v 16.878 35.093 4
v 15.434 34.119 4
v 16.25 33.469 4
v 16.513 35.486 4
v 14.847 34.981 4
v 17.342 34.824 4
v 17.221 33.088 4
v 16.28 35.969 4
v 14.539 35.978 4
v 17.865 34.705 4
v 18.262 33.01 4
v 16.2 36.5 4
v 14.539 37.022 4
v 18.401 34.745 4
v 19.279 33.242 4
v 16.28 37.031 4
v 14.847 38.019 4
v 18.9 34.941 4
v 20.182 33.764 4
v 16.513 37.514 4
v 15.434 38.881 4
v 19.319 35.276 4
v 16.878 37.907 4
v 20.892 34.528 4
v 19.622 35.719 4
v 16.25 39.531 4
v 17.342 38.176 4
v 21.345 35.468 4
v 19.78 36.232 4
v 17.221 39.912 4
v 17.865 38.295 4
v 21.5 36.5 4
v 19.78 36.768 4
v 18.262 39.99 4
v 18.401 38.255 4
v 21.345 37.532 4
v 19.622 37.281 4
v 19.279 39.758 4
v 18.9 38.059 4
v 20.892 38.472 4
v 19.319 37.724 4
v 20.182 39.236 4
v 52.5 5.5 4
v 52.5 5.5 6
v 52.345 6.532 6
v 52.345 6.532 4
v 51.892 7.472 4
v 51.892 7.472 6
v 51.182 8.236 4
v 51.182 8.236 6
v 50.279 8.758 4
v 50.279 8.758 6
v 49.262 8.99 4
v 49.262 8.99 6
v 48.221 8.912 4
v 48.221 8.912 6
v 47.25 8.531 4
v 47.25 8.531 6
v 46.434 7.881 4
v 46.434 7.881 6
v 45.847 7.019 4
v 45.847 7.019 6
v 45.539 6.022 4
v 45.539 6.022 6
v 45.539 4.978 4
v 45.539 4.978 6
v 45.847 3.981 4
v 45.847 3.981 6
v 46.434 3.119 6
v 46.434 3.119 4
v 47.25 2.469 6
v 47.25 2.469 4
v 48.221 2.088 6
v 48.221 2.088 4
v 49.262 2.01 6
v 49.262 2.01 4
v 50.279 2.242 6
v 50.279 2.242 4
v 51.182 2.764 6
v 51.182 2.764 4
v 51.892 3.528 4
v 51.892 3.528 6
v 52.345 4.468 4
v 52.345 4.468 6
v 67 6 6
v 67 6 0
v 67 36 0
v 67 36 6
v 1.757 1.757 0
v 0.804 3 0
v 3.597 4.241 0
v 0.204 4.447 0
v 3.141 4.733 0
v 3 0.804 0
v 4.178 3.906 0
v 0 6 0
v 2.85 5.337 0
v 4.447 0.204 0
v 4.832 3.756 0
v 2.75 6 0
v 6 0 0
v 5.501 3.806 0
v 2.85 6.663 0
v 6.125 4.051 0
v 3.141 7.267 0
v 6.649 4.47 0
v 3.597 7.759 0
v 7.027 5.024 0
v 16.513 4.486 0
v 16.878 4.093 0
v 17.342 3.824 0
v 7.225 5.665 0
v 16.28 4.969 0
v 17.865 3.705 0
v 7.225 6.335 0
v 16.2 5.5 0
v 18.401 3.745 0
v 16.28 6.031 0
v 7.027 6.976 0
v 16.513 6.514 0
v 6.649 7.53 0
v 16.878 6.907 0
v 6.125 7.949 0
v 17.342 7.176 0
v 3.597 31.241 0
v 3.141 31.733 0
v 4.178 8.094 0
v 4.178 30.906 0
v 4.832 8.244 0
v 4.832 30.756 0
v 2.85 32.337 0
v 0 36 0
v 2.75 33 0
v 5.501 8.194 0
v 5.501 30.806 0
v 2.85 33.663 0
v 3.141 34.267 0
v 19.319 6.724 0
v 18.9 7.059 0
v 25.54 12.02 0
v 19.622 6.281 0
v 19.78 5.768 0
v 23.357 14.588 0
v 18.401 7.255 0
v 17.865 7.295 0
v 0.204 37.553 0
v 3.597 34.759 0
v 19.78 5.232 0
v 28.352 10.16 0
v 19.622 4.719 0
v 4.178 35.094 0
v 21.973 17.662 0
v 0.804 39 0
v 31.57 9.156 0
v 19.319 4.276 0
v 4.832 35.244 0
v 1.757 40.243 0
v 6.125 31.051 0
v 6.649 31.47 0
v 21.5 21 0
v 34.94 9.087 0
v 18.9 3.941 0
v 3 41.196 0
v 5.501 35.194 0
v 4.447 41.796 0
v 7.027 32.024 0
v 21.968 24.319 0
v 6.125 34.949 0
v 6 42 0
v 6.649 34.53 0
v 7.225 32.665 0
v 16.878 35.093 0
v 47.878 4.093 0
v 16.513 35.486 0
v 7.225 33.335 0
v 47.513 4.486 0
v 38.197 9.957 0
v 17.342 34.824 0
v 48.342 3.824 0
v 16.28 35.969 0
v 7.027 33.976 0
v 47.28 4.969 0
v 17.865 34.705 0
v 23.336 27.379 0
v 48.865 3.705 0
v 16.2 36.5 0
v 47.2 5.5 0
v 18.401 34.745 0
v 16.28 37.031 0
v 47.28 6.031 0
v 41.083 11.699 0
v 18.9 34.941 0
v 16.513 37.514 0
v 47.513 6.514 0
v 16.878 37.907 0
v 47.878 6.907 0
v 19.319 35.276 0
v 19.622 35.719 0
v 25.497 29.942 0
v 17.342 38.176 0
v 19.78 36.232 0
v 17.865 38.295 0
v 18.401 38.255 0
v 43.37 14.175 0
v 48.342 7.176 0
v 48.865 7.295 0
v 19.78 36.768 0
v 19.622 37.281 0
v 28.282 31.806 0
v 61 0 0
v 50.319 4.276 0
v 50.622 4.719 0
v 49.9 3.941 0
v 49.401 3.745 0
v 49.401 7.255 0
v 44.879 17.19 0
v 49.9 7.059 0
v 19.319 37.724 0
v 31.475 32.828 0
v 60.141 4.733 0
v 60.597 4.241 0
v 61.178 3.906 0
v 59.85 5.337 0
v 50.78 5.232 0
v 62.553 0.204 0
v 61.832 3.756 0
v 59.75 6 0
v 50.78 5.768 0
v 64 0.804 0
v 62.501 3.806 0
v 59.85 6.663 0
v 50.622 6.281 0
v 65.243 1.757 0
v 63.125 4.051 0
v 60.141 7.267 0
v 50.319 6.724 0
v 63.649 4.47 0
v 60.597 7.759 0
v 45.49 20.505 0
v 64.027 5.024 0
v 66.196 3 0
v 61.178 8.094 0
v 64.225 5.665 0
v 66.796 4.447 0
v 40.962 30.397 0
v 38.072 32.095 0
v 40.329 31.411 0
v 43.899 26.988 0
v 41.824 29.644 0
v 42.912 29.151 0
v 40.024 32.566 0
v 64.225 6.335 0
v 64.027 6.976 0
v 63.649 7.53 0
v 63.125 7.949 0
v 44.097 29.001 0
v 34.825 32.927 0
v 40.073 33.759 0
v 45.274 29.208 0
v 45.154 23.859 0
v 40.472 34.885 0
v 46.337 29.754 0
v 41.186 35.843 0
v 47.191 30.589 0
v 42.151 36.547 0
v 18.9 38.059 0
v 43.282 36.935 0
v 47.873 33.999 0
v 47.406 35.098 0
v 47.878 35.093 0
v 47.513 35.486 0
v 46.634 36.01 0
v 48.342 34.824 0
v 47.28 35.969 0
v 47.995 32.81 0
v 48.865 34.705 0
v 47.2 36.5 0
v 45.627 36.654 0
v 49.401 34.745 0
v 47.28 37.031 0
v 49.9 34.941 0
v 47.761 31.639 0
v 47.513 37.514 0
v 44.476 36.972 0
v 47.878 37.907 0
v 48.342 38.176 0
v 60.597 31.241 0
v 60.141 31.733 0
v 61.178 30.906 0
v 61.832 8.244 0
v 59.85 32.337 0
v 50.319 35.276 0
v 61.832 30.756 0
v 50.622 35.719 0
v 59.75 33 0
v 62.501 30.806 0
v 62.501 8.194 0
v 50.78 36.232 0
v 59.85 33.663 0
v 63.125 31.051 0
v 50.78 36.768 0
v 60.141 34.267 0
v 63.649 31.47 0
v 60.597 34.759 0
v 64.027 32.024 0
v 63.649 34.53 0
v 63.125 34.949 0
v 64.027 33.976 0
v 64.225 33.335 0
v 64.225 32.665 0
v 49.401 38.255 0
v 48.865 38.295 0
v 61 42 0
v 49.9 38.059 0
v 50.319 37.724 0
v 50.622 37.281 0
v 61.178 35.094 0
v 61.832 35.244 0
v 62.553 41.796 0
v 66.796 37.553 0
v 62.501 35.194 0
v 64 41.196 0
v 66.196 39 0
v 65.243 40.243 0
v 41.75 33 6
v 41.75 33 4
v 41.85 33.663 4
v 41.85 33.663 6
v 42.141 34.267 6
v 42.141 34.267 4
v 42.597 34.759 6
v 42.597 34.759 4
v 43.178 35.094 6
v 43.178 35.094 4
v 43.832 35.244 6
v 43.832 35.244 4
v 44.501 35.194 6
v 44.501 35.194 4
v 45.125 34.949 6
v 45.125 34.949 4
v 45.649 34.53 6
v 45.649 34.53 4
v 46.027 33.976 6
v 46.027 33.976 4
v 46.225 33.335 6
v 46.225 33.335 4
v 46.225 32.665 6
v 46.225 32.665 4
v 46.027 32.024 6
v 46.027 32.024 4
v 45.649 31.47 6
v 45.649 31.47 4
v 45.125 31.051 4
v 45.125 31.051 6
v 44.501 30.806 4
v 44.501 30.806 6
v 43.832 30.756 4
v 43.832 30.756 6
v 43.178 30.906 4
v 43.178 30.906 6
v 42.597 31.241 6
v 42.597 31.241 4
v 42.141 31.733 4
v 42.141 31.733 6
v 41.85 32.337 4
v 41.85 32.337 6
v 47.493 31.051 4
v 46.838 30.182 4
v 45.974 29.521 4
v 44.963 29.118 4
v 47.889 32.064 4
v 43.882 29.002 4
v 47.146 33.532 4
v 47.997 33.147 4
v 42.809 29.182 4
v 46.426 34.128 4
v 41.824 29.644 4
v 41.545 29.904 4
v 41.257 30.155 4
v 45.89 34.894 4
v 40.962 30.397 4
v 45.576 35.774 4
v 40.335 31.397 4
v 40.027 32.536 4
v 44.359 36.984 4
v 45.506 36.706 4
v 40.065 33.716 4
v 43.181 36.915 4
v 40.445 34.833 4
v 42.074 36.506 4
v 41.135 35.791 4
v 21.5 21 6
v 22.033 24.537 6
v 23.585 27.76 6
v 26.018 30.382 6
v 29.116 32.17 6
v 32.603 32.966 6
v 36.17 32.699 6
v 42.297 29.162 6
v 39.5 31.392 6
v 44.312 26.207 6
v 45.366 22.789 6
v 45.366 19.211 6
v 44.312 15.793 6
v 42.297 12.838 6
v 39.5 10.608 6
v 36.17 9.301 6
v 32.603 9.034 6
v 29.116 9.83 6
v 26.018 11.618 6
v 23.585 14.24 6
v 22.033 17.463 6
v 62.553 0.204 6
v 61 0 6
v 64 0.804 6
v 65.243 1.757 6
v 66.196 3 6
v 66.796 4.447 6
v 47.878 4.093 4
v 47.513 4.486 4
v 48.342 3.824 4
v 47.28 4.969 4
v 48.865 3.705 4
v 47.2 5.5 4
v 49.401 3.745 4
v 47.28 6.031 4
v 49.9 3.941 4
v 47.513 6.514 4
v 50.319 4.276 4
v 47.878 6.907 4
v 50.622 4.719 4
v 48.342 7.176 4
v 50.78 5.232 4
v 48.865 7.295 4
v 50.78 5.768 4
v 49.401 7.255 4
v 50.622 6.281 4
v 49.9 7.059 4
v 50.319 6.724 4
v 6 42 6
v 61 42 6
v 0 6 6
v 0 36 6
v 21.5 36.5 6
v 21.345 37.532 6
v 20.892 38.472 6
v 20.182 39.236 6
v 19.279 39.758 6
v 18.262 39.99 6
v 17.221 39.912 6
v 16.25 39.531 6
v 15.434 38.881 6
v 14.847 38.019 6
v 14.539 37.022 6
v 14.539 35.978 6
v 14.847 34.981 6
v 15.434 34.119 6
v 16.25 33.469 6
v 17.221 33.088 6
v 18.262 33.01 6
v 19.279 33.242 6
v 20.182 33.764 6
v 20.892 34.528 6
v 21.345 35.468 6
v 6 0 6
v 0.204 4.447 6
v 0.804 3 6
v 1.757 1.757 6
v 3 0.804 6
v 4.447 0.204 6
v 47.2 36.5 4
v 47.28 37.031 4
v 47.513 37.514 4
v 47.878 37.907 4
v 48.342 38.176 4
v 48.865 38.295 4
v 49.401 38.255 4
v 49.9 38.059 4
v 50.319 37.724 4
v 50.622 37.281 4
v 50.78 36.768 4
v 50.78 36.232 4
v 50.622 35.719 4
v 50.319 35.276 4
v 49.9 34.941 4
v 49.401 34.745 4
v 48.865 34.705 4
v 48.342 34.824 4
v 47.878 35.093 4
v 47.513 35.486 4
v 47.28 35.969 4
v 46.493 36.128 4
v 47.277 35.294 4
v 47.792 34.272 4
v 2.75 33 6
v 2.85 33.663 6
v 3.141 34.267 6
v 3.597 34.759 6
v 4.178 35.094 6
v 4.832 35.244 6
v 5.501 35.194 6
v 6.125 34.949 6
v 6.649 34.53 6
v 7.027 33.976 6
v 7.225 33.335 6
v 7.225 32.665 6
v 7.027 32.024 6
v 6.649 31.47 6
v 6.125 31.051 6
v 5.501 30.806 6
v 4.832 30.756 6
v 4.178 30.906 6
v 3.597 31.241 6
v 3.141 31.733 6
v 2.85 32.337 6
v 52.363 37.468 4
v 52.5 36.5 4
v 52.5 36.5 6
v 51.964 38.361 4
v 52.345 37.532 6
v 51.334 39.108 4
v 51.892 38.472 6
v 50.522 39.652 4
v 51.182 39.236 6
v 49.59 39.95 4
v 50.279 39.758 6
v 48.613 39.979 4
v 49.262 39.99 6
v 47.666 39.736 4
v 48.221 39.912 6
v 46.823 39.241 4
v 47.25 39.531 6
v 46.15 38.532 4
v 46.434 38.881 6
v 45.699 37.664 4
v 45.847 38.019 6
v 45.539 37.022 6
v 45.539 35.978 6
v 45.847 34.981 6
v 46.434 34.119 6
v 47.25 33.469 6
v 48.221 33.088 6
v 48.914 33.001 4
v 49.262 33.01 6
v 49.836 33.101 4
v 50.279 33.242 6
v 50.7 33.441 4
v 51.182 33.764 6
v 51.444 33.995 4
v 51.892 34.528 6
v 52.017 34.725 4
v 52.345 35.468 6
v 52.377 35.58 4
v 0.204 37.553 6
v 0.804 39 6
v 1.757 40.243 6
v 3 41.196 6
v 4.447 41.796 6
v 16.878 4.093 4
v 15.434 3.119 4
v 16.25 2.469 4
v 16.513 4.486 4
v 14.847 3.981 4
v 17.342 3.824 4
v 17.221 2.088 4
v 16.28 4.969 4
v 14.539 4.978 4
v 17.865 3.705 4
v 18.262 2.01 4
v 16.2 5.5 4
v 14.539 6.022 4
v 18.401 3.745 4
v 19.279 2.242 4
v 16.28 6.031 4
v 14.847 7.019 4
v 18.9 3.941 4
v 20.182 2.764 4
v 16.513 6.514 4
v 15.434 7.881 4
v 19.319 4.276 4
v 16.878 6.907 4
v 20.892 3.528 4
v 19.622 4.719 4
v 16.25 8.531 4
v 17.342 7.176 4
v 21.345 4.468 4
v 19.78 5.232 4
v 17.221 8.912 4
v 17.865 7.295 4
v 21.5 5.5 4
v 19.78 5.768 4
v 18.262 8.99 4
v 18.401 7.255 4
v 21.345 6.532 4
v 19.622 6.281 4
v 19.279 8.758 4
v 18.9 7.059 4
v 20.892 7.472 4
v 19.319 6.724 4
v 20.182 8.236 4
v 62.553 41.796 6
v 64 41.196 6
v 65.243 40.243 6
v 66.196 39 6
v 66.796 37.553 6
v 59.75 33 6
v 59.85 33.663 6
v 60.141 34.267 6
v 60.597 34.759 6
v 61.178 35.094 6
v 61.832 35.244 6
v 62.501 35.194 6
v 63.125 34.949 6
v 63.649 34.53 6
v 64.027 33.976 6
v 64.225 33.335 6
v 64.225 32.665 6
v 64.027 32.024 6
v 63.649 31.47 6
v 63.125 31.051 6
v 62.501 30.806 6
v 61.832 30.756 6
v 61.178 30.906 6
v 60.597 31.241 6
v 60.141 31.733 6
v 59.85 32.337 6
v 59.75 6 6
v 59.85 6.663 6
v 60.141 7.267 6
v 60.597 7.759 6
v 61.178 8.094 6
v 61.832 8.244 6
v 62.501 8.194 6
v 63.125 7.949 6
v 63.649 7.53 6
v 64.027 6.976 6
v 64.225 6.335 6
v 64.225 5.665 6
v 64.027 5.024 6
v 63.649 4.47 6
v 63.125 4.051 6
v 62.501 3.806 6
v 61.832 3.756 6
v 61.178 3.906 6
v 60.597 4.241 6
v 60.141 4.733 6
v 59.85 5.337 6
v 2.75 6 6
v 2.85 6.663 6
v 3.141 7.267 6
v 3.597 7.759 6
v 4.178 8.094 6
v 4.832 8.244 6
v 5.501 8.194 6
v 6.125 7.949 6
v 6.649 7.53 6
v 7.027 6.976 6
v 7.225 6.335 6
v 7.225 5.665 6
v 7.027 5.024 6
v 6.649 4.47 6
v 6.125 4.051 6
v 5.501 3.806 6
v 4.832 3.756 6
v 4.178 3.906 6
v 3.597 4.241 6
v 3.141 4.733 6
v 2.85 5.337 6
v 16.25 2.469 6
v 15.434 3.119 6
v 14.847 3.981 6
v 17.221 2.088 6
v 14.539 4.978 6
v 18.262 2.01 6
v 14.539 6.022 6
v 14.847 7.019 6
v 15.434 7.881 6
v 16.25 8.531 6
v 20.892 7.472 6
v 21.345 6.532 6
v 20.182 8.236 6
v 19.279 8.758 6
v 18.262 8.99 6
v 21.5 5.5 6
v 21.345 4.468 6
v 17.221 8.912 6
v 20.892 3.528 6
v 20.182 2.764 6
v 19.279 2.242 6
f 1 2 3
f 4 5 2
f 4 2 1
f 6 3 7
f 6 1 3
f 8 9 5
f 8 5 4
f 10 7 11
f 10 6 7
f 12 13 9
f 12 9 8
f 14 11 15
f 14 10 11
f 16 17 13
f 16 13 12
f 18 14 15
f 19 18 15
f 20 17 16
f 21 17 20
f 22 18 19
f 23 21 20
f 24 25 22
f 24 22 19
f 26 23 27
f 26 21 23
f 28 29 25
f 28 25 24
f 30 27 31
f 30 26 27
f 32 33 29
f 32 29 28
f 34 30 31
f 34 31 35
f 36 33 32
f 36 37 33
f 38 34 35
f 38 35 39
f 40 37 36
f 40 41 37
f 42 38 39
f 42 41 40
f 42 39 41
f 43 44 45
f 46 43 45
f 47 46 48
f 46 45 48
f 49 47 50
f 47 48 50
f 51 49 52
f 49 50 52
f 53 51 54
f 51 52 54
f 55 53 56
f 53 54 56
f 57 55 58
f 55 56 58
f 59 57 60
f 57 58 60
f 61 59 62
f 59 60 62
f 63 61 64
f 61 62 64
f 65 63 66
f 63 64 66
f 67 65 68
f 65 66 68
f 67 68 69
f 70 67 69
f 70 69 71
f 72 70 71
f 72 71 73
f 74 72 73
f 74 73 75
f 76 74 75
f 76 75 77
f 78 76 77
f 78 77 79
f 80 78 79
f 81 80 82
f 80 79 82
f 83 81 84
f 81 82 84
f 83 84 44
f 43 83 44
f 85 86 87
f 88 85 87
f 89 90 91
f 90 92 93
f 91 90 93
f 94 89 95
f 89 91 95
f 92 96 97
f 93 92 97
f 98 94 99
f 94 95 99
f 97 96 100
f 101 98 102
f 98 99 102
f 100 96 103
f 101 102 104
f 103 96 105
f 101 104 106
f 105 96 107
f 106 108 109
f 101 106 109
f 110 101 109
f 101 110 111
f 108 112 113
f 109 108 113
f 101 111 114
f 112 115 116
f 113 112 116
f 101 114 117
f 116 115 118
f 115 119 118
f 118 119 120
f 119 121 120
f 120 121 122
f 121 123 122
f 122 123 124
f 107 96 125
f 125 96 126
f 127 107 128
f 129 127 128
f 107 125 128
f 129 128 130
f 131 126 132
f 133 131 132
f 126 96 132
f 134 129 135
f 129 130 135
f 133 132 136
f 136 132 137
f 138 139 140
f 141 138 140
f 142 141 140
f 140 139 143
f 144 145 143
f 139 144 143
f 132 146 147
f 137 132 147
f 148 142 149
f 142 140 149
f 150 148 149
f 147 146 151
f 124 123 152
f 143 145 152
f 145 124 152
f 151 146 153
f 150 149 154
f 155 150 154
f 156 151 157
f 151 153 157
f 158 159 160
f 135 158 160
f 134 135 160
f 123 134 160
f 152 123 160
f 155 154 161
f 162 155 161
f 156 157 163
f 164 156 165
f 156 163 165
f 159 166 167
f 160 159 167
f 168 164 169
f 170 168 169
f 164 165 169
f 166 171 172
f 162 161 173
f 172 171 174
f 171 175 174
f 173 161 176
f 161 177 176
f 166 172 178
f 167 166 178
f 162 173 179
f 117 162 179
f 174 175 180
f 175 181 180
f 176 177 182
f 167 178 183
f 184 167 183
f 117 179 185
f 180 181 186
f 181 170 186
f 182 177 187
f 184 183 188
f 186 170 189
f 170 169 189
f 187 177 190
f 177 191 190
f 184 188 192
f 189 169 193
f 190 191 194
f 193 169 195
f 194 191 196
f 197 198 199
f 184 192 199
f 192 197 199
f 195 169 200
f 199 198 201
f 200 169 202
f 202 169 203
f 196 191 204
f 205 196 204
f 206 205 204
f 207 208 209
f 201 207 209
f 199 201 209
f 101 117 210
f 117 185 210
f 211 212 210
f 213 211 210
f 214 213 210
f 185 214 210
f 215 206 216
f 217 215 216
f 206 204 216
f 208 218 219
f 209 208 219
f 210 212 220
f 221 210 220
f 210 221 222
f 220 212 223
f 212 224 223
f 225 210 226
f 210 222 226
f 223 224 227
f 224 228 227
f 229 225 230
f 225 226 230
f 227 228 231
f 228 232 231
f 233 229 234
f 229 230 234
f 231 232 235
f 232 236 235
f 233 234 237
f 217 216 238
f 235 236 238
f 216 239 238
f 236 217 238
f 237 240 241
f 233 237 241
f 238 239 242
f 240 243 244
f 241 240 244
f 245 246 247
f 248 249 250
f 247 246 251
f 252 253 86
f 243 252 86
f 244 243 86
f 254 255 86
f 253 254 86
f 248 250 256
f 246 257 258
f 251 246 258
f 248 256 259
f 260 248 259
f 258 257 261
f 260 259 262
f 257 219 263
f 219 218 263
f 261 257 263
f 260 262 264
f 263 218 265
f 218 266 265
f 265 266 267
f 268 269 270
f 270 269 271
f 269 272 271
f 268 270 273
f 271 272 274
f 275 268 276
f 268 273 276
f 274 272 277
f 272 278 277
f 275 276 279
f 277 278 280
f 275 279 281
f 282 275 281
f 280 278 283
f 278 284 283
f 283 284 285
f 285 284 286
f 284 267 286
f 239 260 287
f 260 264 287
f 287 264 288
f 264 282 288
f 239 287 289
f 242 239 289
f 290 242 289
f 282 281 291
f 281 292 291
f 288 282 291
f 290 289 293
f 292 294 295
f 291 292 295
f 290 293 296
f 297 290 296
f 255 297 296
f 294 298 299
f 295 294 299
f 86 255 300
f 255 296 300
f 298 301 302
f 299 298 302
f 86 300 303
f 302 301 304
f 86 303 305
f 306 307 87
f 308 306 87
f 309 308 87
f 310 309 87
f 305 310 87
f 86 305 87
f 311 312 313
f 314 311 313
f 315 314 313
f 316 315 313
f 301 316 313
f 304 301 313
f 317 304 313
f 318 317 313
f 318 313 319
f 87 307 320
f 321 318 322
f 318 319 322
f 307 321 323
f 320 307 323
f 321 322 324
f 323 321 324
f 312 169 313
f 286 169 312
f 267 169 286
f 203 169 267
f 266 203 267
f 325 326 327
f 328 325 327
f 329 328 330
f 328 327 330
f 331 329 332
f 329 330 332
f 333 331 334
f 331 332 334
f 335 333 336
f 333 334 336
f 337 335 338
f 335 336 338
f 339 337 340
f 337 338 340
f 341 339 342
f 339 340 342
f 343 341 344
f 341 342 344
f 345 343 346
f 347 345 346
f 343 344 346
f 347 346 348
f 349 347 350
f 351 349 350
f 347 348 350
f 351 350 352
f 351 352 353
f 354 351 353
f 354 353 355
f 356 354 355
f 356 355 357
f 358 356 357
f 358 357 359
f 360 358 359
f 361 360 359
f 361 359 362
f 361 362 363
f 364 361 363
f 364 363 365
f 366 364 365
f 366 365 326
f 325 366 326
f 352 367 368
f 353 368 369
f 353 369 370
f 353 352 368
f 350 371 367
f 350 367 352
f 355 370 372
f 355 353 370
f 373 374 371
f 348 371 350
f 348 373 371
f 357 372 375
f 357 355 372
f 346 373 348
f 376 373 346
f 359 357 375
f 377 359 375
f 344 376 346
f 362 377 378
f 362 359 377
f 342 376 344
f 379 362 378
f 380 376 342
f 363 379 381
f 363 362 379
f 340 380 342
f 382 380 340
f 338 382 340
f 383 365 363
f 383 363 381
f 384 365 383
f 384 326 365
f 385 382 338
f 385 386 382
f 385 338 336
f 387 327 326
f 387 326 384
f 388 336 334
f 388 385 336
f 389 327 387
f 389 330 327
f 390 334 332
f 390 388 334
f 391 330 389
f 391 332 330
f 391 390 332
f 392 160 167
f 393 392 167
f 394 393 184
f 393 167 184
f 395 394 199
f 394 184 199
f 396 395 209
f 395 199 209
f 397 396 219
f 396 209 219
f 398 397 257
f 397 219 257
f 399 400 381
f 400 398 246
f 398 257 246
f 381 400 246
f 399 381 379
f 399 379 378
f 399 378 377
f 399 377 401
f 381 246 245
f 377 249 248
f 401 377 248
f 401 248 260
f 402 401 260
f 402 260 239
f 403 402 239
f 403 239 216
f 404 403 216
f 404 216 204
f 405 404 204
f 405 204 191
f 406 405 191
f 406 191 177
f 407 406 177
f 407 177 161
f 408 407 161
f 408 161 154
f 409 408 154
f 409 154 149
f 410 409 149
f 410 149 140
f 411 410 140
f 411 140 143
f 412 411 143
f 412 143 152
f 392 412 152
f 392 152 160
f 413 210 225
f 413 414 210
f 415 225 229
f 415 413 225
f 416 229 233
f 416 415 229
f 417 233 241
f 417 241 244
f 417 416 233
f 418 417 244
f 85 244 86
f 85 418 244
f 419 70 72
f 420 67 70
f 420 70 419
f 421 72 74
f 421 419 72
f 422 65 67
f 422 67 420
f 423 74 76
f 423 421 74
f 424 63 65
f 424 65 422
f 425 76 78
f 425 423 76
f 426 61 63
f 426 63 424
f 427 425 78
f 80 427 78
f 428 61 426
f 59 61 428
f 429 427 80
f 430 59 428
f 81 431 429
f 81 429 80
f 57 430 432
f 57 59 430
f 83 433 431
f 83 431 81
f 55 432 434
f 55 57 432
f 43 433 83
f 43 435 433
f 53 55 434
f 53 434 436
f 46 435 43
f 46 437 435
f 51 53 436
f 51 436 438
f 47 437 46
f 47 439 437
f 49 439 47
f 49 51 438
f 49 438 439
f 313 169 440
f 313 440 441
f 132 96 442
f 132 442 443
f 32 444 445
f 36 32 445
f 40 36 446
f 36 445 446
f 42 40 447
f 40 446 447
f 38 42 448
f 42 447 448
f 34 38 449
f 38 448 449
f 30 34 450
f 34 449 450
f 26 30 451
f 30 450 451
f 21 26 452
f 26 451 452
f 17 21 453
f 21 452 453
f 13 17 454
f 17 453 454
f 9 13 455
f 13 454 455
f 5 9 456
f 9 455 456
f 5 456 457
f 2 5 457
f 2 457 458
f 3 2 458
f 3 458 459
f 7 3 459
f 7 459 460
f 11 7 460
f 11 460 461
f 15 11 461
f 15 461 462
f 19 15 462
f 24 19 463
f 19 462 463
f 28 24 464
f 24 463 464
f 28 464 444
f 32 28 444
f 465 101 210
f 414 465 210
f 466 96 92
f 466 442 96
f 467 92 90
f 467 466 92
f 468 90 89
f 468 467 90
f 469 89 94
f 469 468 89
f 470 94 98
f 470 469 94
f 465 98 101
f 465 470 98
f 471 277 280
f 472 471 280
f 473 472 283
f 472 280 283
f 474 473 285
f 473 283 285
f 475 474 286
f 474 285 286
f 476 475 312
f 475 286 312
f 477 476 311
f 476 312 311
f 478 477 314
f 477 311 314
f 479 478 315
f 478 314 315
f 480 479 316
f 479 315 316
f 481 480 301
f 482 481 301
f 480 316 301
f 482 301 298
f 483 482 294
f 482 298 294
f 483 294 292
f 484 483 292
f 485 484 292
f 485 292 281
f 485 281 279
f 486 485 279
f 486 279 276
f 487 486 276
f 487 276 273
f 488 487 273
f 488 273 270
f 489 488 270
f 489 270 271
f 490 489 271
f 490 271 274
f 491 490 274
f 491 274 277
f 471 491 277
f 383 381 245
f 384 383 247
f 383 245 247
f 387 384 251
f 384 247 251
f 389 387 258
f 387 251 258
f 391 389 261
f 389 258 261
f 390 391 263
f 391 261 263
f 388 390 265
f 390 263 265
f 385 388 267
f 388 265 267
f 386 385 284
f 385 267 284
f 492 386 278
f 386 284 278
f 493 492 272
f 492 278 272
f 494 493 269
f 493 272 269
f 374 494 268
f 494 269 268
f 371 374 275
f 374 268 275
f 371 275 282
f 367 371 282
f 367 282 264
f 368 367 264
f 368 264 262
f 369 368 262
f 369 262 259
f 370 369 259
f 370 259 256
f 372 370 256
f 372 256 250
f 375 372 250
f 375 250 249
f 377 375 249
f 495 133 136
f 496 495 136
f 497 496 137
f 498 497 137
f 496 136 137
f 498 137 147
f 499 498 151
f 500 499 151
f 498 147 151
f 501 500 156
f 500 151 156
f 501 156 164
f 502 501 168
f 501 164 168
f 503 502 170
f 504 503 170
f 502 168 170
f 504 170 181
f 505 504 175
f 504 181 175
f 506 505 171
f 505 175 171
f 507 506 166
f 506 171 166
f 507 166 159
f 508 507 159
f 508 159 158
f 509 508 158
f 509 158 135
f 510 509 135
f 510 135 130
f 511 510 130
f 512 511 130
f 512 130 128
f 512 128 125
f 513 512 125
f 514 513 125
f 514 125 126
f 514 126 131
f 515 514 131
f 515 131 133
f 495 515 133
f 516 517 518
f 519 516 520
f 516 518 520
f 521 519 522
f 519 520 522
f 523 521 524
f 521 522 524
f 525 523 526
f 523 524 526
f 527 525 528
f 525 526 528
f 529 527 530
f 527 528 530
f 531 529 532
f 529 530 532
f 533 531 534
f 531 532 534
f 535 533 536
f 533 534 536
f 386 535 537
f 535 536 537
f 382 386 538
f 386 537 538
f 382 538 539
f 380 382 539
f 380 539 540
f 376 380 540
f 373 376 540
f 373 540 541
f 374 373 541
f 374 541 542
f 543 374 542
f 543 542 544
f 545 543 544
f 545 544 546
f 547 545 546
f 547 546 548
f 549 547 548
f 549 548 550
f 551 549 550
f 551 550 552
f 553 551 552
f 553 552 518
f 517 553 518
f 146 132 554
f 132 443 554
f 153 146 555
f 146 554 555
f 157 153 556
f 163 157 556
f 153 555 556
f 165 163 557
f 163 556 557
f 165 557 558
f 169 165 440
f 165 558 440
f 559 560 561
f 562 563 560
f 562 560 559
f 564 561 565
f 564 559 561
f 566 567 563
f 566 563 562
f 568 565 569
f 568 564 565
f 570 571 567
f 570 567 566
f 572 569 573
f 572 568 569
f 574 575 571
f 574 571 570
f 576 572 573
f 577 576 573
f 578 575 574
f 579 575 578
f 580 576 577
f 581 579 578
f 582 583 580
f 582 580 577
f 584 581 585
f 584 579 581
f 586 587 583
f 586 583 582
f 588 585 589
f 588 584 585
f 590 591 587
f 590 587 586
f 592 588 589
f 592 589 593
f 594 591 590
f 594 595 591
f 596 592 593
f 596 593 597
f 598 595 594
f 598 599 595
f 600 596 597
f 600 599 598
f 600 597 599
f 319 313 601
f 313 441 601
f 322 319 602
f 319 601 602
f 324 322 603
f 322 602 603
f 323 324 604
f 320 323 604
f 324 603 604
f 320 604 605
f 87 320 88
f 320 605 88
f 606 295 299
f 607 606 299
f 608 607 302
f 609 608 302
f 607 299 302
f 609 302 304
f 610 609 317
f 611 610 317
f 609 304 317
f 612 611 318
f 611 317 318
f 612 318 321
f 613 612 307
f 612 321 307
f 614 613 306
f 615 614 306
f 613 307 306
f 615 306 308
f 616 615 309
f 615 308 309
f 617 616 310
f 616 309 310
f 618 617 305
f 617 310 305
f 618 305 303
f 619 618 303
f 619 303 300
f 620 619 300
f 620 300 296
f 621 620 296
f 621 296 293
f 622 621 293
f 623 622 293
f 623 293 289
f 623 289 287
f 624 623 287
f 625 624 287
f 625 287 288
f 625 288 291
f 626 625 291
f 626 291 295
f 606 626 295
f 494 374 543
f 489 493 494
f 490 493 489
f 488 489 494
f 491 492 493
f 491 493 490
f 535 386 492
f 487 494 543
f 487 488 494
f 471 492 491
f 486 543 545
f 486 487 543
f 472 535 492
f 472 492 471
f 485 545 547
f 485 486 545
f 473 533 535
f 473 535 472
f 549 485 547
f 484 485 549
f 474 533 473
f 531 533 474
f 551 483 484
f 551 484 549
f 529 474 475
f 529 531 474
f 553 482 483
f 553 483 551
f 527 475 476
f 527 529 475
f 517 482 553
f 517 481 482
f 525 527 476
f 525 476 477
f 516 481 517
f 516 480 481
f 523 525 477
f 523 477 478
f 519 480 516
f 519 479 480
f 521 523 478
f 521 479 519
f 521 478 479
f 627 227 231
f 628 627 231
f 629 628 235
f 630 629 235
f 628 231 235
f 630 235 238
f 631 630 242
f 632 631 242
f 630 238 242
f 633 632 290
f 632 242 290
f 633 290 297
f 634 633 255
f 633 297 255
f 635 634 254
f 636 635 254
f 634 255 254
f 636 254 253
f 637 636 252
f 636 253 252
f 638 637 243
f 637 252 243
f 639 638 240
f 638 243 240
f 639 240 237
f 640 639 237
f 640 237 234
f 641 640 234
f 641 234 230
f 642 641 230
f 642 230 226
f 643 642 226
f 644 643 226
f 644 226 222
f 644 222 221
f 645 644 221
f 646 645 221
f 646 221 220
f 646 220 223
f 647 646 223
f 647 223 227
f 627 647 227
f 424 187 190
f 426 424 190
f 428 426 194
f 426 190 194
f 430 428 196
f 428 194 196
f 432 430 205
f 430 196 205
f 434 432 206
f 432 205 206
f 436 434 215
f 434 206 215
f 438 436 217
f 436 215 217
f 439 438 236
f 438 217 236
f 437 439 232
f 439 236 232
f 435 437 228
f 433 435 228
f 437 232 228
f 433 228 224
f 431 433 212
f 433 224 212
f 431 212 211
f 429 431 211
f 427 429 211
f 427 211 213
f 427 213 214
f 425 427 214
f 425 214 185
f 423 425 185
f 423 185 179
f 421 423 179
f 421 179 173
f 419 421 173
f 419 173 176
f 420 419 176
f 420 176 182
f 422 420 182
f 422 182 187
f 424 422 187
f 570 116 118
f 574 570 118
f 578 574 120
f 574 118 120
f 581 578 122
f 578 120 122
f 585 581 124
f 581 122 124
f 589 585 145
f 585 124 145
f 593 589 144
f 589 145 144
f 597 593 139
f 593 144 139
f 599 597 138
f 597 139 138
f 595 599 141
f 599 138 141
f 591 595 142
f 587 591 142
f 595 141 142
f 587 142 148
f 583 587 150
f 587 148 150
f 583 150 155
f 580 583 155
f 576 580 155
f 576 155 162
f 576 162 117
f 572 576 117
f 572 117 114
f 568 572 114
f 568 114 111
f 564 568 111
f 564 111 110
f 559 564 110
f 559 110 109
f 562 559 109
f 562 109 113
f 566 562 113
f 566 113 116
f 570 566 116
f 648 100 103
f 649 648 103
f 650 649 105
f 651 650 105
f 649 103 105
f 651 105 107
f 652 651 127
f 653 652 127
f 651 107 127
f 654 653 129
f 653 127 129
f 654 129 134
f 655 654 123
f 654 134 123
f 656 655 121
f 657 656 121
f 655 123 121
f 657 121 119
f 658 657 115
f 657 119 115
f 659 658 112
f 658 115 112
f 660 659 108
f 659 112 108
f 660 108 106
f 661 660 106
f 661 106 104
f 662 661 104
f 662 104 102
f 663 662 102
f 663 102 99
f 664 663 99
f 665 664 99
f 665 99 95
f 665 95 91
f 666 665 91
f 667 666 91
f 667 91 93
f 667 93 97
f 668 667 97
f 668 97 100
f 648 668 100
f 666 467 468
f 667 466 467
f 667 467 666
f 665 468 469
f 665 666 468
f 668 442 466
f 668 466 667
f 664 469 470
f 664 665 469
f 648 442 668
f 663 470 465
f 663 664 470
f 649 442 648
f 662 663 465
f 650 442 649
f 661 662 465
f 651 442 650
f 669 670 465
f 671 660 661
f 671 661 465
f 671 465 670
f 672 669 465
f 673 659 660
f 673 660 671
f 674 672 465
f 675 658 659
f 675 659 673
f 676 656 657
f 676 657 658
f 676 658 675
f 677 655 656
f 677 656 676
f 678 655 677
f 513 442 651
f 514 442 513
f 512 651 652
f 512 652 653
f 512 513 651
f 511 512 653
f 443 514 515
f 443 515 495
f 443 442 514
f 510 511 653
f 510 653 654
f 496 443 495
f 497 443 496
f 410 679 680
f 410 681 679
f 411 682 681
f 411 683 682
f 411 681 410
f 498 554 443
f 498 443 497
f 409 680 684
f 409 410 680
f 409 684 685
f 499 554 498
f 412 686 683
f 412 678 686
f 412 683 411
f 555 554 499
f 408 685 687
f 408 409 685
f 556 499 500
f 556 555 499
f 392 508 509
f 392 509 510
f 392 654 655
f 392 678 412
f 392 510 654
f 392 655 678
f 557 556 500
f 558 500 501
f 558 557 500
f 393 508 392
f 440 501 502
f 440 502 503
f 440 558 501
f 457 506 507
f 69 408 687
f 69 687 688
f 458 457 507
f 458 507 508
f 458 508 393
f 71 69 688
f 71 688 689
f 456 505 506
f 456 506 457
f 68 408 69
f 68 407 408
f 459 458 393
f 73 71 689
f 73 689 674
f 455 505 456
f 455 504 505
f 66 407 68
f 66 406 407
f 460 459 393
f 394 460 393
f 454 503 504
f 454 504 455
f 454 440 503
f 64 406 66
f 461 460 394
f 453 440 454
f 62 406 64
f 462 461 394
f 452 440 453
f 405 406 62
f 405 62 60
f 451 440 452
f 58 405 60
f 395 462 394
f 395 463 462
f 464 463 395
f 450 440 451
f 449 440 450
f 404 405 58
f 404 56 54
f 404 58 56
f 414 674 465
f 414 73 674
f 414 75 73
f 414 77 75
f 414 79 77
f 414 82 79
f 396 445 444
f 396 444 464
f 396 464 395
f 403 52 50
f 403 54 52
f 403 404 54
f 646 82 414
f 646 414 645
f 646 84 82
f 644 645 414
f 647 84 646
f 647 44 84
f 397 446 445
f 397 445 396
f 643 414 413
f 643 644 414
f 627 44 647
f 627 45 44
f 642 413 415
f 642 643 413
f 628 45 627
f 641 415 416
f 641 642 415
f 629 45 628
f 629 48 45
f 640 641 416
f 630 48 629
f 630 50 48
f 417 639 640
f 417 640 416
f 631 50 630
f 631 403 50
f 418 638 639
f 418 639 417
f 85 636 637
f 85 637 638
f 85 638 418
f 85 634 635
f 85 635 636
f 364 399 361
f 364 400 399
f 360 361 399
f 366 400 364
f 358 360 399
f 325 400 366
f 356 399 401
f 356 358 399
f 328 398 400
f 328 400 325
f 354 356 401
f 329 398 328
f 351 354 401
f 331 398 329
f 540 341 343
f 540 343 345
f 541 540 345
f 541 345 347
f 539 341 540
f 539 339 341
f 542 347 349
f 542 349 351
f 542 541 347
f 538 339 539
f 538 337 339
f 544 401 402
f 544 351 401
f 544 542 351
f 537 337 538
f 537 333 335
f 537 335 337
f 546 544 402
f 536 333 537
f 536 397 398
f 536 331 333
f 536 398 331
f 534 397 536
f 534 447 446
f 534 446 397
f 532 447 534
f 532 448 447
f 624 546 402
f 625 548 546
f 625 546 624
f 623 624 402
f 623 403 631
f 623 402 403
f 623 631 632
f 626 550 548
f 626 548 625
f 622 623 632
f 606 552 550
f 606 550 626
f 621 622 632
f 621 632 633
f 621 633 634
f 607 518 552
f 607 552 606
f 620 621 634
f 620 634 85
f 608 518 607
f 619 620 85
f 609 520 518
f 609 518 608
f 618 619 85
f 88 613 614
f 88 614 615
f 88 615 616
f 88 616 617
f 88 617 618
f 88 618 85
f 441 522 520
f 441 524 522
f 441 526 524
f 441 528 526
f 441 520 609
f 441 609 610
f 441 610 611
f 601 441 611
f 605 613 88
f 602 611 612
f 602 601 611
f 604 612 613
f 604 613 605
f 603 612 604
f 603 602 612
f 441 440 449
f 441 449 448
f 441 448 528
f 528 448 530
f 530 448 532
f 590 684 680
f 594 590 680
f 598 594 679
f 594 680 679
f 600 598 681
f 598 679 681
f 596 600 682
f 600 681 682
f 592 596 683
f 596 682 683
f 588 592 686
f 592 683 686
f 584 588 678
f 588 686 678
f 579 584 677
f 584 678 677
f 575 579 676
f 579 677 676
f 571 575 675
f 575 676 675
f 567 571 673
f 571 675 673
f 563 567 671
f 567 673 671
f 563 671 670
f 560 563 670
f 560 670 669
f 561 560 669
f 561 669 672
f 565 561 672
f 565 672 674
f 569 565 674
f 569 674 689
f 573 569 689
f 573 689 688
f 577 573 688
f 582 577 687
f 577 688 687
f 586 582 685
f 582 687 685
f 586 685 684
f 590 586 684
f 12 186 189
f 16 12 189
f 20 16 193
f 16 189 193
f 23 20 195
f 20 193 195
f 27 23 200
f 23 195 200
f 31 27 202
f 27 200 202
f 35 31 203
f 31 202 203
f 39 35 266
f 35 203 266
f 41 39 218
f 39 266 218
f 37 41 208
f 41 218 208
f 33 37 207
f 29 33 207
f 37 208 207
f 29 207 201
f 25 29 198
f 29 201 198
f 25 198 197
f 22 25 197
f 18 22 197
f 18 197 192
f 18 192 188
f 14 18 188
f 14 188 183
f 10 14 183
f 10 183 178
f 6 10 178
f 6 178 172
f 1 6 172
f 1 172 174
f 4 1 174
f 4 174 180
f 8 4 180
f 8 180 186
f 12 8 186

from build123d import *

# Parameters (mm, degrees)
SKETCH_1_W          = 67
SKETCH_1_H          = 42
EXTRUDE_1_DEPTH     = 6
SKETCH_2_R          = 2.25
CUT_EXTRUDE_1_DEPTH = 9
FILLET_1_R          = 6
SKETCH_3_R          = 12
SKETCH_3_R_2        = 1.8
CUT_EXTRUDE_2_DEPTH = 10
SKETCH_4_R          = 3.5
CUT_EXTRUDE_3_DEPTH = 2
SKETCH_8_R          = 4
SKETCH_8_R_2        = 2.25
CUT_EXTRUDE_6_DEPTH = 4
SKETCH_8_2_R        = 2.25
CUT_EXTRUDE_7_DEPTH = 26


with BuildPart() as part:
    # Эскиз1 → Бобышка-Вытянуть1 (new body)
    with BuildSketch(Plane.XY):
        with Locations((33.5, 21)):
            Rectangle(SKETCH_1_W, SKETCH_1_H)
    extrude(amount=EXTRUDE_1_DEPTH)

    # Эскиз2 → Вырез-Вытянуть1 (cut)
    with BuildSketch(Plane(origin=(0, 0, 0), x_dir=(-1, 0, 0), z_dir=(0, 0, -1))):
        with Locations((-62, 6)):
            Circle(SKETCH_2_R)
        with Locations((-62, 33)):
            Circle(SKETCH_2_R)
        with Locations((-5, 6)):
            Circle(SKETCH_2_R)
        with Locations((-5, 33)):
            Circle(SKETCH_2_R)
    extrude(amount=-CUT_EXTRUDE_1_DEPTH, mode=Mode.SUBTRACT)

    # Скругление1
    fillet_1_edges = [part.edges().sort_by_distance(p)[0] for p in [
        (0, 0, 3),
        (0, 42, 3),
        (67, 0, 3),
        (67, 42, 3),
    ]]
    fillet(fillet_1_edges, radius=FILLET_1_R)

    # Эскиз3 → Вырез-Вытянуть2 (cut)
    with BuildSketch(Plane(origin=(0, 0, 0), x_dir=(-1, 0, 0), z_dir=(0, 0, -1))):
        with Locations((-33.5, 21)):
            Circle(SKETCH_3_R)
        with Locations((-18, 36.5)):
            Circle(SKETCH_3_R_2)
        with Locations((-18, 5.5)):
            Circle(SKETCH_3_R_2)
        with Locations((-49, 5.5)):
            Circle(SKETCH_3_R_2)
        with Locations((-49, 36.5)):
            Circle(SKETCH_3_R_2)
    extrude(amount=-CUT_EXTRUDE_2_DEPTH, mode=Mode.SUBTRACT)

    # Эскиз4 → Вырез-Вытянуть3 (cut)
    with BuildSketch(Plane.XY.offset(6)):
        with Locations((18, 5.5)):
            Circle(SKETCH_4_R)
        with Locations((18, 36.5)):
            Circle(SKETCH_4_R)
        with Locations((49, 5.5)):
            Circle(SKETCH_4_R)
        with Locations((49, 36.5)):
            Circle(SKETCH_4_R)
    extrude(amount=-CUT_EXTRUDE_3_DEPTH, mode=Mode.SUBTRACT)

    # Эскиз8 → Вырез-Вытянуть6 (cut)
    with BuildSketch(Plane(origin=(0, 0, 0), x_dir=(-1, 0, 0), z_dir=(0, 0, -1))):
        with Locations((-44, 33)):
            Circle(SKETCH_8_R)
        with Locations((-44, 33)):
            Circle(SKETCH_8_R_2, mode=Mode.SUBTRACT)
    extrude(amount=-CUT_EXTRUDE_6_DEPTH, mode=Mode.SUBTRACT)

    # Эскиз8<2> → Вырез-Вытянуть7 (cut)
    with BuildSketch(Plane(origin=(0, 0, 0), x_dir=(-1, 0, 0), z_dir=(0, 0, -1))):
        with Locations((-44, 33)):
            Circle(SKETCH_8_2_R)
    extrude(amount=-CUT_EXTRUDE_7_DEPTH, mode=Mode.SUBTRACT)


solid = part.part
